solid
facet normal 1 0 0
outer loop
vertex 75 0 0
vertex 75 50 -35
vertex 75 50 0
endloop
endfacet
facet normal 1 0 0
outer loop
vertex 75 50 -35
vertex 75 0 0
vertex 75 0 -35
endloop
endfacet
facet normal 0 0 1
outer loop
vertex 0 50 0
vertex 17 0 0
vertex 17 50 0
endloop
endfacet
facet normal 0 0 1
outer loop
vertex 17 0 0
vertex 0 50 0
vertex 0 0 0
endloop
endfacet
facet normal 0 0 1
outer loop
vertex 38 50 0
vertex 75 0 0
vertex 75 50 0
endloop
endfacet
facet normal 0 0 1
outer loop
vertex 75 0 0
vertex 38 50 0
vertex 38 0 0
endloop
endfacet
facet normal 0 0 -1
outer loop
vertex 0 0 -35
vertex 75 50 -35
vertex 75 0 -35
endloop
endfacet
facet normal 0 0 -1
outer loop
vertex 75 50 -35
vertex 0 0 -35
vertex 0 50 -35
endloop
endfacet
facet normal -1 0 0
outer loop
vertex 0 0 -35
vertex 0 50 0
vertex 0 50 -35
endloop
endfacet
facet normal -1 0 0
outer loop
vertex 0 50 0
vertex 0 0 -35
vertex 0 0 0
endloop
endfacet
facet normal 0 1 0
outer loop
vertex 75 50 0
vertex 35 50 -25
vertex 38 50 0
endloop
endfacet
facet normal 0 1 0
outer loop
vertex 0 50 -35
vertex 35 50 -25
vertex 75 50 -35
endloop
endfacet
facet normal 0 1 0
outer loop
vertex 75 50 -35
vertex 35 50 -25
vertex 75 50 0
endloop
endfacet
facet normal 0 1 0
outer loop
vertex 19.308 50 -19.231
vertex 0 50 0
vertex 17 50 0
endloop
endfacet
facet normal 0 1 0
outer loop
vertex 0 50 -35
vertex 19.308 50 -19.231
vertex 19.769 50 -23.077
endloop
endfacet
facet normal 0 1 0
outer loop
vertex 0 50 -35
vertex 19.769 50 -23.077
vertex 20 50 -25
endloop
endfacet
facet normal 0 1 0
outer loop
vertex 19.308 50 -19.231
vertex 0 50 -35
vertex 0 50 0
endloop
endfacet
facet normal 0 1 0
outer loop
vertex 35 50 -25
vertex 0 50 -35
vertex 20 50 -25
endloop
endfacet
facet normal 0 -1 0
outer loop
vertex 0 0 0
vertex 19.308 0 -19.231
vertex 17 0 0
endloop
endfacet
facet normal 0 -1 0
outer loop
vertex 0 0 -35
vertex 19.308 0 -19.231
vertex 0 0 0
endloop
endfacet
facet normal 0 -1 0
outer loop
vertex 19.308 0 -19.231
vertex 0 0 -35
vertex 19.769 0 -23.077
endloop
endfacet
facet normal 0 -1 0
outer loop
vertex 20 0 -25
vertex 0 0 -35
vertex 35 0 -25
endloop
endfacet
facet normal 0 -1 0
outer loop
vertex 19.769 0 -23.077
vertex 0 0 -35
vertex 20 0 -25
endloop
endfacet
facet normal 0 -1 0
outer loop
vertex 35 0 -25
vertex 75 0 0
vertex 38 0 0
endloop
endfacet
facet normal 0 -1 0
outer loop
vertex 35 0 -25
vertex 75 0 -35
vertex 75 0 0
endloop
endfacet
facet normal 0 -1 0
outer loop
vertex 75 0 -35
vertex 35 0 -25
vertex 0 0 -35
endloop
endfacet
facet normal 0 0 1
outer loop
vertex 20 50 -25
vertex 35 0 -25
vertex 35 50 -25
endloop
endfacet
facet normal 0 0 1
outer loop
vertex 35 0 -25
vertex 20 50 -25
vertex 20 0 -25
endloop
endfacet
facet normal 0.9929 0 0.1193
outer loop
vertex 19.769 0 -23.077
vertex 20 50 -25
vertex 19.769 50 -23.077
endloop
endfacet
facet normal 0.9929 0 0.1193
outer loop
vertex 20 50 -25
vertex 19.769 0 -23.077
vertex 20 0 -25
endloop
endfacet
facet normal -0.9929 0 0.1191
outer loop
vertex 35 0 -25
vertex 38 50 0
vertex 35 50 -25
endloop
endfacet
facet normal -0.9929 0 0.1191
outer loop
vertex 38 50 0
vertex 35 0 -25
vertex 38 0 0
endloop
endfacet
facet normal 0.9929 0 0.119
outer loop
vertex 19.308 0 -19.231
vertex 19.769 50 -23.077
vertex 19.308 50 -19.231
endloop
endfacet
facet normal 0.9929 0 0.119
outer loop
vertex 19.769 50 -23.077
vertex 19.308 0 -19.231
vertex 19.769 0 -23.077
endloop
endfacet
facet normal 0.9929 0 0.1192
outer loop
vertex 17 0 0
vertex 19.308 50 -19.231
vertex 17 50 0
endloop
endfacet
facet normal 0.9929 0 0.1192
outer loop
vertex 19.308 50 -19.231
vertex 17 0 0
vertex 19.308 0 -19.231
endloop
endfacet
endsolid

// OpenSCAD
mr = 40; // margin between the slot and the wall
ml = 20;
sw = 15; // slot width

d = 50; // depth of the extrude
bh = 10; // height below the slot
sh = 25; // height of the slot

fr = 2.5; // fillet radius

module block(bh){
    difference() {
        translate([0,0,-bh-sh]) cube([mr+ml+sw, d, bh+sh]);
        translate([ml,0,-sh]) translate([sw/2,d/2,0]) linear_extrude(height=sh, scale=[1.4,1]) square([sw, d], center=true);
    }
}

block(bh);
